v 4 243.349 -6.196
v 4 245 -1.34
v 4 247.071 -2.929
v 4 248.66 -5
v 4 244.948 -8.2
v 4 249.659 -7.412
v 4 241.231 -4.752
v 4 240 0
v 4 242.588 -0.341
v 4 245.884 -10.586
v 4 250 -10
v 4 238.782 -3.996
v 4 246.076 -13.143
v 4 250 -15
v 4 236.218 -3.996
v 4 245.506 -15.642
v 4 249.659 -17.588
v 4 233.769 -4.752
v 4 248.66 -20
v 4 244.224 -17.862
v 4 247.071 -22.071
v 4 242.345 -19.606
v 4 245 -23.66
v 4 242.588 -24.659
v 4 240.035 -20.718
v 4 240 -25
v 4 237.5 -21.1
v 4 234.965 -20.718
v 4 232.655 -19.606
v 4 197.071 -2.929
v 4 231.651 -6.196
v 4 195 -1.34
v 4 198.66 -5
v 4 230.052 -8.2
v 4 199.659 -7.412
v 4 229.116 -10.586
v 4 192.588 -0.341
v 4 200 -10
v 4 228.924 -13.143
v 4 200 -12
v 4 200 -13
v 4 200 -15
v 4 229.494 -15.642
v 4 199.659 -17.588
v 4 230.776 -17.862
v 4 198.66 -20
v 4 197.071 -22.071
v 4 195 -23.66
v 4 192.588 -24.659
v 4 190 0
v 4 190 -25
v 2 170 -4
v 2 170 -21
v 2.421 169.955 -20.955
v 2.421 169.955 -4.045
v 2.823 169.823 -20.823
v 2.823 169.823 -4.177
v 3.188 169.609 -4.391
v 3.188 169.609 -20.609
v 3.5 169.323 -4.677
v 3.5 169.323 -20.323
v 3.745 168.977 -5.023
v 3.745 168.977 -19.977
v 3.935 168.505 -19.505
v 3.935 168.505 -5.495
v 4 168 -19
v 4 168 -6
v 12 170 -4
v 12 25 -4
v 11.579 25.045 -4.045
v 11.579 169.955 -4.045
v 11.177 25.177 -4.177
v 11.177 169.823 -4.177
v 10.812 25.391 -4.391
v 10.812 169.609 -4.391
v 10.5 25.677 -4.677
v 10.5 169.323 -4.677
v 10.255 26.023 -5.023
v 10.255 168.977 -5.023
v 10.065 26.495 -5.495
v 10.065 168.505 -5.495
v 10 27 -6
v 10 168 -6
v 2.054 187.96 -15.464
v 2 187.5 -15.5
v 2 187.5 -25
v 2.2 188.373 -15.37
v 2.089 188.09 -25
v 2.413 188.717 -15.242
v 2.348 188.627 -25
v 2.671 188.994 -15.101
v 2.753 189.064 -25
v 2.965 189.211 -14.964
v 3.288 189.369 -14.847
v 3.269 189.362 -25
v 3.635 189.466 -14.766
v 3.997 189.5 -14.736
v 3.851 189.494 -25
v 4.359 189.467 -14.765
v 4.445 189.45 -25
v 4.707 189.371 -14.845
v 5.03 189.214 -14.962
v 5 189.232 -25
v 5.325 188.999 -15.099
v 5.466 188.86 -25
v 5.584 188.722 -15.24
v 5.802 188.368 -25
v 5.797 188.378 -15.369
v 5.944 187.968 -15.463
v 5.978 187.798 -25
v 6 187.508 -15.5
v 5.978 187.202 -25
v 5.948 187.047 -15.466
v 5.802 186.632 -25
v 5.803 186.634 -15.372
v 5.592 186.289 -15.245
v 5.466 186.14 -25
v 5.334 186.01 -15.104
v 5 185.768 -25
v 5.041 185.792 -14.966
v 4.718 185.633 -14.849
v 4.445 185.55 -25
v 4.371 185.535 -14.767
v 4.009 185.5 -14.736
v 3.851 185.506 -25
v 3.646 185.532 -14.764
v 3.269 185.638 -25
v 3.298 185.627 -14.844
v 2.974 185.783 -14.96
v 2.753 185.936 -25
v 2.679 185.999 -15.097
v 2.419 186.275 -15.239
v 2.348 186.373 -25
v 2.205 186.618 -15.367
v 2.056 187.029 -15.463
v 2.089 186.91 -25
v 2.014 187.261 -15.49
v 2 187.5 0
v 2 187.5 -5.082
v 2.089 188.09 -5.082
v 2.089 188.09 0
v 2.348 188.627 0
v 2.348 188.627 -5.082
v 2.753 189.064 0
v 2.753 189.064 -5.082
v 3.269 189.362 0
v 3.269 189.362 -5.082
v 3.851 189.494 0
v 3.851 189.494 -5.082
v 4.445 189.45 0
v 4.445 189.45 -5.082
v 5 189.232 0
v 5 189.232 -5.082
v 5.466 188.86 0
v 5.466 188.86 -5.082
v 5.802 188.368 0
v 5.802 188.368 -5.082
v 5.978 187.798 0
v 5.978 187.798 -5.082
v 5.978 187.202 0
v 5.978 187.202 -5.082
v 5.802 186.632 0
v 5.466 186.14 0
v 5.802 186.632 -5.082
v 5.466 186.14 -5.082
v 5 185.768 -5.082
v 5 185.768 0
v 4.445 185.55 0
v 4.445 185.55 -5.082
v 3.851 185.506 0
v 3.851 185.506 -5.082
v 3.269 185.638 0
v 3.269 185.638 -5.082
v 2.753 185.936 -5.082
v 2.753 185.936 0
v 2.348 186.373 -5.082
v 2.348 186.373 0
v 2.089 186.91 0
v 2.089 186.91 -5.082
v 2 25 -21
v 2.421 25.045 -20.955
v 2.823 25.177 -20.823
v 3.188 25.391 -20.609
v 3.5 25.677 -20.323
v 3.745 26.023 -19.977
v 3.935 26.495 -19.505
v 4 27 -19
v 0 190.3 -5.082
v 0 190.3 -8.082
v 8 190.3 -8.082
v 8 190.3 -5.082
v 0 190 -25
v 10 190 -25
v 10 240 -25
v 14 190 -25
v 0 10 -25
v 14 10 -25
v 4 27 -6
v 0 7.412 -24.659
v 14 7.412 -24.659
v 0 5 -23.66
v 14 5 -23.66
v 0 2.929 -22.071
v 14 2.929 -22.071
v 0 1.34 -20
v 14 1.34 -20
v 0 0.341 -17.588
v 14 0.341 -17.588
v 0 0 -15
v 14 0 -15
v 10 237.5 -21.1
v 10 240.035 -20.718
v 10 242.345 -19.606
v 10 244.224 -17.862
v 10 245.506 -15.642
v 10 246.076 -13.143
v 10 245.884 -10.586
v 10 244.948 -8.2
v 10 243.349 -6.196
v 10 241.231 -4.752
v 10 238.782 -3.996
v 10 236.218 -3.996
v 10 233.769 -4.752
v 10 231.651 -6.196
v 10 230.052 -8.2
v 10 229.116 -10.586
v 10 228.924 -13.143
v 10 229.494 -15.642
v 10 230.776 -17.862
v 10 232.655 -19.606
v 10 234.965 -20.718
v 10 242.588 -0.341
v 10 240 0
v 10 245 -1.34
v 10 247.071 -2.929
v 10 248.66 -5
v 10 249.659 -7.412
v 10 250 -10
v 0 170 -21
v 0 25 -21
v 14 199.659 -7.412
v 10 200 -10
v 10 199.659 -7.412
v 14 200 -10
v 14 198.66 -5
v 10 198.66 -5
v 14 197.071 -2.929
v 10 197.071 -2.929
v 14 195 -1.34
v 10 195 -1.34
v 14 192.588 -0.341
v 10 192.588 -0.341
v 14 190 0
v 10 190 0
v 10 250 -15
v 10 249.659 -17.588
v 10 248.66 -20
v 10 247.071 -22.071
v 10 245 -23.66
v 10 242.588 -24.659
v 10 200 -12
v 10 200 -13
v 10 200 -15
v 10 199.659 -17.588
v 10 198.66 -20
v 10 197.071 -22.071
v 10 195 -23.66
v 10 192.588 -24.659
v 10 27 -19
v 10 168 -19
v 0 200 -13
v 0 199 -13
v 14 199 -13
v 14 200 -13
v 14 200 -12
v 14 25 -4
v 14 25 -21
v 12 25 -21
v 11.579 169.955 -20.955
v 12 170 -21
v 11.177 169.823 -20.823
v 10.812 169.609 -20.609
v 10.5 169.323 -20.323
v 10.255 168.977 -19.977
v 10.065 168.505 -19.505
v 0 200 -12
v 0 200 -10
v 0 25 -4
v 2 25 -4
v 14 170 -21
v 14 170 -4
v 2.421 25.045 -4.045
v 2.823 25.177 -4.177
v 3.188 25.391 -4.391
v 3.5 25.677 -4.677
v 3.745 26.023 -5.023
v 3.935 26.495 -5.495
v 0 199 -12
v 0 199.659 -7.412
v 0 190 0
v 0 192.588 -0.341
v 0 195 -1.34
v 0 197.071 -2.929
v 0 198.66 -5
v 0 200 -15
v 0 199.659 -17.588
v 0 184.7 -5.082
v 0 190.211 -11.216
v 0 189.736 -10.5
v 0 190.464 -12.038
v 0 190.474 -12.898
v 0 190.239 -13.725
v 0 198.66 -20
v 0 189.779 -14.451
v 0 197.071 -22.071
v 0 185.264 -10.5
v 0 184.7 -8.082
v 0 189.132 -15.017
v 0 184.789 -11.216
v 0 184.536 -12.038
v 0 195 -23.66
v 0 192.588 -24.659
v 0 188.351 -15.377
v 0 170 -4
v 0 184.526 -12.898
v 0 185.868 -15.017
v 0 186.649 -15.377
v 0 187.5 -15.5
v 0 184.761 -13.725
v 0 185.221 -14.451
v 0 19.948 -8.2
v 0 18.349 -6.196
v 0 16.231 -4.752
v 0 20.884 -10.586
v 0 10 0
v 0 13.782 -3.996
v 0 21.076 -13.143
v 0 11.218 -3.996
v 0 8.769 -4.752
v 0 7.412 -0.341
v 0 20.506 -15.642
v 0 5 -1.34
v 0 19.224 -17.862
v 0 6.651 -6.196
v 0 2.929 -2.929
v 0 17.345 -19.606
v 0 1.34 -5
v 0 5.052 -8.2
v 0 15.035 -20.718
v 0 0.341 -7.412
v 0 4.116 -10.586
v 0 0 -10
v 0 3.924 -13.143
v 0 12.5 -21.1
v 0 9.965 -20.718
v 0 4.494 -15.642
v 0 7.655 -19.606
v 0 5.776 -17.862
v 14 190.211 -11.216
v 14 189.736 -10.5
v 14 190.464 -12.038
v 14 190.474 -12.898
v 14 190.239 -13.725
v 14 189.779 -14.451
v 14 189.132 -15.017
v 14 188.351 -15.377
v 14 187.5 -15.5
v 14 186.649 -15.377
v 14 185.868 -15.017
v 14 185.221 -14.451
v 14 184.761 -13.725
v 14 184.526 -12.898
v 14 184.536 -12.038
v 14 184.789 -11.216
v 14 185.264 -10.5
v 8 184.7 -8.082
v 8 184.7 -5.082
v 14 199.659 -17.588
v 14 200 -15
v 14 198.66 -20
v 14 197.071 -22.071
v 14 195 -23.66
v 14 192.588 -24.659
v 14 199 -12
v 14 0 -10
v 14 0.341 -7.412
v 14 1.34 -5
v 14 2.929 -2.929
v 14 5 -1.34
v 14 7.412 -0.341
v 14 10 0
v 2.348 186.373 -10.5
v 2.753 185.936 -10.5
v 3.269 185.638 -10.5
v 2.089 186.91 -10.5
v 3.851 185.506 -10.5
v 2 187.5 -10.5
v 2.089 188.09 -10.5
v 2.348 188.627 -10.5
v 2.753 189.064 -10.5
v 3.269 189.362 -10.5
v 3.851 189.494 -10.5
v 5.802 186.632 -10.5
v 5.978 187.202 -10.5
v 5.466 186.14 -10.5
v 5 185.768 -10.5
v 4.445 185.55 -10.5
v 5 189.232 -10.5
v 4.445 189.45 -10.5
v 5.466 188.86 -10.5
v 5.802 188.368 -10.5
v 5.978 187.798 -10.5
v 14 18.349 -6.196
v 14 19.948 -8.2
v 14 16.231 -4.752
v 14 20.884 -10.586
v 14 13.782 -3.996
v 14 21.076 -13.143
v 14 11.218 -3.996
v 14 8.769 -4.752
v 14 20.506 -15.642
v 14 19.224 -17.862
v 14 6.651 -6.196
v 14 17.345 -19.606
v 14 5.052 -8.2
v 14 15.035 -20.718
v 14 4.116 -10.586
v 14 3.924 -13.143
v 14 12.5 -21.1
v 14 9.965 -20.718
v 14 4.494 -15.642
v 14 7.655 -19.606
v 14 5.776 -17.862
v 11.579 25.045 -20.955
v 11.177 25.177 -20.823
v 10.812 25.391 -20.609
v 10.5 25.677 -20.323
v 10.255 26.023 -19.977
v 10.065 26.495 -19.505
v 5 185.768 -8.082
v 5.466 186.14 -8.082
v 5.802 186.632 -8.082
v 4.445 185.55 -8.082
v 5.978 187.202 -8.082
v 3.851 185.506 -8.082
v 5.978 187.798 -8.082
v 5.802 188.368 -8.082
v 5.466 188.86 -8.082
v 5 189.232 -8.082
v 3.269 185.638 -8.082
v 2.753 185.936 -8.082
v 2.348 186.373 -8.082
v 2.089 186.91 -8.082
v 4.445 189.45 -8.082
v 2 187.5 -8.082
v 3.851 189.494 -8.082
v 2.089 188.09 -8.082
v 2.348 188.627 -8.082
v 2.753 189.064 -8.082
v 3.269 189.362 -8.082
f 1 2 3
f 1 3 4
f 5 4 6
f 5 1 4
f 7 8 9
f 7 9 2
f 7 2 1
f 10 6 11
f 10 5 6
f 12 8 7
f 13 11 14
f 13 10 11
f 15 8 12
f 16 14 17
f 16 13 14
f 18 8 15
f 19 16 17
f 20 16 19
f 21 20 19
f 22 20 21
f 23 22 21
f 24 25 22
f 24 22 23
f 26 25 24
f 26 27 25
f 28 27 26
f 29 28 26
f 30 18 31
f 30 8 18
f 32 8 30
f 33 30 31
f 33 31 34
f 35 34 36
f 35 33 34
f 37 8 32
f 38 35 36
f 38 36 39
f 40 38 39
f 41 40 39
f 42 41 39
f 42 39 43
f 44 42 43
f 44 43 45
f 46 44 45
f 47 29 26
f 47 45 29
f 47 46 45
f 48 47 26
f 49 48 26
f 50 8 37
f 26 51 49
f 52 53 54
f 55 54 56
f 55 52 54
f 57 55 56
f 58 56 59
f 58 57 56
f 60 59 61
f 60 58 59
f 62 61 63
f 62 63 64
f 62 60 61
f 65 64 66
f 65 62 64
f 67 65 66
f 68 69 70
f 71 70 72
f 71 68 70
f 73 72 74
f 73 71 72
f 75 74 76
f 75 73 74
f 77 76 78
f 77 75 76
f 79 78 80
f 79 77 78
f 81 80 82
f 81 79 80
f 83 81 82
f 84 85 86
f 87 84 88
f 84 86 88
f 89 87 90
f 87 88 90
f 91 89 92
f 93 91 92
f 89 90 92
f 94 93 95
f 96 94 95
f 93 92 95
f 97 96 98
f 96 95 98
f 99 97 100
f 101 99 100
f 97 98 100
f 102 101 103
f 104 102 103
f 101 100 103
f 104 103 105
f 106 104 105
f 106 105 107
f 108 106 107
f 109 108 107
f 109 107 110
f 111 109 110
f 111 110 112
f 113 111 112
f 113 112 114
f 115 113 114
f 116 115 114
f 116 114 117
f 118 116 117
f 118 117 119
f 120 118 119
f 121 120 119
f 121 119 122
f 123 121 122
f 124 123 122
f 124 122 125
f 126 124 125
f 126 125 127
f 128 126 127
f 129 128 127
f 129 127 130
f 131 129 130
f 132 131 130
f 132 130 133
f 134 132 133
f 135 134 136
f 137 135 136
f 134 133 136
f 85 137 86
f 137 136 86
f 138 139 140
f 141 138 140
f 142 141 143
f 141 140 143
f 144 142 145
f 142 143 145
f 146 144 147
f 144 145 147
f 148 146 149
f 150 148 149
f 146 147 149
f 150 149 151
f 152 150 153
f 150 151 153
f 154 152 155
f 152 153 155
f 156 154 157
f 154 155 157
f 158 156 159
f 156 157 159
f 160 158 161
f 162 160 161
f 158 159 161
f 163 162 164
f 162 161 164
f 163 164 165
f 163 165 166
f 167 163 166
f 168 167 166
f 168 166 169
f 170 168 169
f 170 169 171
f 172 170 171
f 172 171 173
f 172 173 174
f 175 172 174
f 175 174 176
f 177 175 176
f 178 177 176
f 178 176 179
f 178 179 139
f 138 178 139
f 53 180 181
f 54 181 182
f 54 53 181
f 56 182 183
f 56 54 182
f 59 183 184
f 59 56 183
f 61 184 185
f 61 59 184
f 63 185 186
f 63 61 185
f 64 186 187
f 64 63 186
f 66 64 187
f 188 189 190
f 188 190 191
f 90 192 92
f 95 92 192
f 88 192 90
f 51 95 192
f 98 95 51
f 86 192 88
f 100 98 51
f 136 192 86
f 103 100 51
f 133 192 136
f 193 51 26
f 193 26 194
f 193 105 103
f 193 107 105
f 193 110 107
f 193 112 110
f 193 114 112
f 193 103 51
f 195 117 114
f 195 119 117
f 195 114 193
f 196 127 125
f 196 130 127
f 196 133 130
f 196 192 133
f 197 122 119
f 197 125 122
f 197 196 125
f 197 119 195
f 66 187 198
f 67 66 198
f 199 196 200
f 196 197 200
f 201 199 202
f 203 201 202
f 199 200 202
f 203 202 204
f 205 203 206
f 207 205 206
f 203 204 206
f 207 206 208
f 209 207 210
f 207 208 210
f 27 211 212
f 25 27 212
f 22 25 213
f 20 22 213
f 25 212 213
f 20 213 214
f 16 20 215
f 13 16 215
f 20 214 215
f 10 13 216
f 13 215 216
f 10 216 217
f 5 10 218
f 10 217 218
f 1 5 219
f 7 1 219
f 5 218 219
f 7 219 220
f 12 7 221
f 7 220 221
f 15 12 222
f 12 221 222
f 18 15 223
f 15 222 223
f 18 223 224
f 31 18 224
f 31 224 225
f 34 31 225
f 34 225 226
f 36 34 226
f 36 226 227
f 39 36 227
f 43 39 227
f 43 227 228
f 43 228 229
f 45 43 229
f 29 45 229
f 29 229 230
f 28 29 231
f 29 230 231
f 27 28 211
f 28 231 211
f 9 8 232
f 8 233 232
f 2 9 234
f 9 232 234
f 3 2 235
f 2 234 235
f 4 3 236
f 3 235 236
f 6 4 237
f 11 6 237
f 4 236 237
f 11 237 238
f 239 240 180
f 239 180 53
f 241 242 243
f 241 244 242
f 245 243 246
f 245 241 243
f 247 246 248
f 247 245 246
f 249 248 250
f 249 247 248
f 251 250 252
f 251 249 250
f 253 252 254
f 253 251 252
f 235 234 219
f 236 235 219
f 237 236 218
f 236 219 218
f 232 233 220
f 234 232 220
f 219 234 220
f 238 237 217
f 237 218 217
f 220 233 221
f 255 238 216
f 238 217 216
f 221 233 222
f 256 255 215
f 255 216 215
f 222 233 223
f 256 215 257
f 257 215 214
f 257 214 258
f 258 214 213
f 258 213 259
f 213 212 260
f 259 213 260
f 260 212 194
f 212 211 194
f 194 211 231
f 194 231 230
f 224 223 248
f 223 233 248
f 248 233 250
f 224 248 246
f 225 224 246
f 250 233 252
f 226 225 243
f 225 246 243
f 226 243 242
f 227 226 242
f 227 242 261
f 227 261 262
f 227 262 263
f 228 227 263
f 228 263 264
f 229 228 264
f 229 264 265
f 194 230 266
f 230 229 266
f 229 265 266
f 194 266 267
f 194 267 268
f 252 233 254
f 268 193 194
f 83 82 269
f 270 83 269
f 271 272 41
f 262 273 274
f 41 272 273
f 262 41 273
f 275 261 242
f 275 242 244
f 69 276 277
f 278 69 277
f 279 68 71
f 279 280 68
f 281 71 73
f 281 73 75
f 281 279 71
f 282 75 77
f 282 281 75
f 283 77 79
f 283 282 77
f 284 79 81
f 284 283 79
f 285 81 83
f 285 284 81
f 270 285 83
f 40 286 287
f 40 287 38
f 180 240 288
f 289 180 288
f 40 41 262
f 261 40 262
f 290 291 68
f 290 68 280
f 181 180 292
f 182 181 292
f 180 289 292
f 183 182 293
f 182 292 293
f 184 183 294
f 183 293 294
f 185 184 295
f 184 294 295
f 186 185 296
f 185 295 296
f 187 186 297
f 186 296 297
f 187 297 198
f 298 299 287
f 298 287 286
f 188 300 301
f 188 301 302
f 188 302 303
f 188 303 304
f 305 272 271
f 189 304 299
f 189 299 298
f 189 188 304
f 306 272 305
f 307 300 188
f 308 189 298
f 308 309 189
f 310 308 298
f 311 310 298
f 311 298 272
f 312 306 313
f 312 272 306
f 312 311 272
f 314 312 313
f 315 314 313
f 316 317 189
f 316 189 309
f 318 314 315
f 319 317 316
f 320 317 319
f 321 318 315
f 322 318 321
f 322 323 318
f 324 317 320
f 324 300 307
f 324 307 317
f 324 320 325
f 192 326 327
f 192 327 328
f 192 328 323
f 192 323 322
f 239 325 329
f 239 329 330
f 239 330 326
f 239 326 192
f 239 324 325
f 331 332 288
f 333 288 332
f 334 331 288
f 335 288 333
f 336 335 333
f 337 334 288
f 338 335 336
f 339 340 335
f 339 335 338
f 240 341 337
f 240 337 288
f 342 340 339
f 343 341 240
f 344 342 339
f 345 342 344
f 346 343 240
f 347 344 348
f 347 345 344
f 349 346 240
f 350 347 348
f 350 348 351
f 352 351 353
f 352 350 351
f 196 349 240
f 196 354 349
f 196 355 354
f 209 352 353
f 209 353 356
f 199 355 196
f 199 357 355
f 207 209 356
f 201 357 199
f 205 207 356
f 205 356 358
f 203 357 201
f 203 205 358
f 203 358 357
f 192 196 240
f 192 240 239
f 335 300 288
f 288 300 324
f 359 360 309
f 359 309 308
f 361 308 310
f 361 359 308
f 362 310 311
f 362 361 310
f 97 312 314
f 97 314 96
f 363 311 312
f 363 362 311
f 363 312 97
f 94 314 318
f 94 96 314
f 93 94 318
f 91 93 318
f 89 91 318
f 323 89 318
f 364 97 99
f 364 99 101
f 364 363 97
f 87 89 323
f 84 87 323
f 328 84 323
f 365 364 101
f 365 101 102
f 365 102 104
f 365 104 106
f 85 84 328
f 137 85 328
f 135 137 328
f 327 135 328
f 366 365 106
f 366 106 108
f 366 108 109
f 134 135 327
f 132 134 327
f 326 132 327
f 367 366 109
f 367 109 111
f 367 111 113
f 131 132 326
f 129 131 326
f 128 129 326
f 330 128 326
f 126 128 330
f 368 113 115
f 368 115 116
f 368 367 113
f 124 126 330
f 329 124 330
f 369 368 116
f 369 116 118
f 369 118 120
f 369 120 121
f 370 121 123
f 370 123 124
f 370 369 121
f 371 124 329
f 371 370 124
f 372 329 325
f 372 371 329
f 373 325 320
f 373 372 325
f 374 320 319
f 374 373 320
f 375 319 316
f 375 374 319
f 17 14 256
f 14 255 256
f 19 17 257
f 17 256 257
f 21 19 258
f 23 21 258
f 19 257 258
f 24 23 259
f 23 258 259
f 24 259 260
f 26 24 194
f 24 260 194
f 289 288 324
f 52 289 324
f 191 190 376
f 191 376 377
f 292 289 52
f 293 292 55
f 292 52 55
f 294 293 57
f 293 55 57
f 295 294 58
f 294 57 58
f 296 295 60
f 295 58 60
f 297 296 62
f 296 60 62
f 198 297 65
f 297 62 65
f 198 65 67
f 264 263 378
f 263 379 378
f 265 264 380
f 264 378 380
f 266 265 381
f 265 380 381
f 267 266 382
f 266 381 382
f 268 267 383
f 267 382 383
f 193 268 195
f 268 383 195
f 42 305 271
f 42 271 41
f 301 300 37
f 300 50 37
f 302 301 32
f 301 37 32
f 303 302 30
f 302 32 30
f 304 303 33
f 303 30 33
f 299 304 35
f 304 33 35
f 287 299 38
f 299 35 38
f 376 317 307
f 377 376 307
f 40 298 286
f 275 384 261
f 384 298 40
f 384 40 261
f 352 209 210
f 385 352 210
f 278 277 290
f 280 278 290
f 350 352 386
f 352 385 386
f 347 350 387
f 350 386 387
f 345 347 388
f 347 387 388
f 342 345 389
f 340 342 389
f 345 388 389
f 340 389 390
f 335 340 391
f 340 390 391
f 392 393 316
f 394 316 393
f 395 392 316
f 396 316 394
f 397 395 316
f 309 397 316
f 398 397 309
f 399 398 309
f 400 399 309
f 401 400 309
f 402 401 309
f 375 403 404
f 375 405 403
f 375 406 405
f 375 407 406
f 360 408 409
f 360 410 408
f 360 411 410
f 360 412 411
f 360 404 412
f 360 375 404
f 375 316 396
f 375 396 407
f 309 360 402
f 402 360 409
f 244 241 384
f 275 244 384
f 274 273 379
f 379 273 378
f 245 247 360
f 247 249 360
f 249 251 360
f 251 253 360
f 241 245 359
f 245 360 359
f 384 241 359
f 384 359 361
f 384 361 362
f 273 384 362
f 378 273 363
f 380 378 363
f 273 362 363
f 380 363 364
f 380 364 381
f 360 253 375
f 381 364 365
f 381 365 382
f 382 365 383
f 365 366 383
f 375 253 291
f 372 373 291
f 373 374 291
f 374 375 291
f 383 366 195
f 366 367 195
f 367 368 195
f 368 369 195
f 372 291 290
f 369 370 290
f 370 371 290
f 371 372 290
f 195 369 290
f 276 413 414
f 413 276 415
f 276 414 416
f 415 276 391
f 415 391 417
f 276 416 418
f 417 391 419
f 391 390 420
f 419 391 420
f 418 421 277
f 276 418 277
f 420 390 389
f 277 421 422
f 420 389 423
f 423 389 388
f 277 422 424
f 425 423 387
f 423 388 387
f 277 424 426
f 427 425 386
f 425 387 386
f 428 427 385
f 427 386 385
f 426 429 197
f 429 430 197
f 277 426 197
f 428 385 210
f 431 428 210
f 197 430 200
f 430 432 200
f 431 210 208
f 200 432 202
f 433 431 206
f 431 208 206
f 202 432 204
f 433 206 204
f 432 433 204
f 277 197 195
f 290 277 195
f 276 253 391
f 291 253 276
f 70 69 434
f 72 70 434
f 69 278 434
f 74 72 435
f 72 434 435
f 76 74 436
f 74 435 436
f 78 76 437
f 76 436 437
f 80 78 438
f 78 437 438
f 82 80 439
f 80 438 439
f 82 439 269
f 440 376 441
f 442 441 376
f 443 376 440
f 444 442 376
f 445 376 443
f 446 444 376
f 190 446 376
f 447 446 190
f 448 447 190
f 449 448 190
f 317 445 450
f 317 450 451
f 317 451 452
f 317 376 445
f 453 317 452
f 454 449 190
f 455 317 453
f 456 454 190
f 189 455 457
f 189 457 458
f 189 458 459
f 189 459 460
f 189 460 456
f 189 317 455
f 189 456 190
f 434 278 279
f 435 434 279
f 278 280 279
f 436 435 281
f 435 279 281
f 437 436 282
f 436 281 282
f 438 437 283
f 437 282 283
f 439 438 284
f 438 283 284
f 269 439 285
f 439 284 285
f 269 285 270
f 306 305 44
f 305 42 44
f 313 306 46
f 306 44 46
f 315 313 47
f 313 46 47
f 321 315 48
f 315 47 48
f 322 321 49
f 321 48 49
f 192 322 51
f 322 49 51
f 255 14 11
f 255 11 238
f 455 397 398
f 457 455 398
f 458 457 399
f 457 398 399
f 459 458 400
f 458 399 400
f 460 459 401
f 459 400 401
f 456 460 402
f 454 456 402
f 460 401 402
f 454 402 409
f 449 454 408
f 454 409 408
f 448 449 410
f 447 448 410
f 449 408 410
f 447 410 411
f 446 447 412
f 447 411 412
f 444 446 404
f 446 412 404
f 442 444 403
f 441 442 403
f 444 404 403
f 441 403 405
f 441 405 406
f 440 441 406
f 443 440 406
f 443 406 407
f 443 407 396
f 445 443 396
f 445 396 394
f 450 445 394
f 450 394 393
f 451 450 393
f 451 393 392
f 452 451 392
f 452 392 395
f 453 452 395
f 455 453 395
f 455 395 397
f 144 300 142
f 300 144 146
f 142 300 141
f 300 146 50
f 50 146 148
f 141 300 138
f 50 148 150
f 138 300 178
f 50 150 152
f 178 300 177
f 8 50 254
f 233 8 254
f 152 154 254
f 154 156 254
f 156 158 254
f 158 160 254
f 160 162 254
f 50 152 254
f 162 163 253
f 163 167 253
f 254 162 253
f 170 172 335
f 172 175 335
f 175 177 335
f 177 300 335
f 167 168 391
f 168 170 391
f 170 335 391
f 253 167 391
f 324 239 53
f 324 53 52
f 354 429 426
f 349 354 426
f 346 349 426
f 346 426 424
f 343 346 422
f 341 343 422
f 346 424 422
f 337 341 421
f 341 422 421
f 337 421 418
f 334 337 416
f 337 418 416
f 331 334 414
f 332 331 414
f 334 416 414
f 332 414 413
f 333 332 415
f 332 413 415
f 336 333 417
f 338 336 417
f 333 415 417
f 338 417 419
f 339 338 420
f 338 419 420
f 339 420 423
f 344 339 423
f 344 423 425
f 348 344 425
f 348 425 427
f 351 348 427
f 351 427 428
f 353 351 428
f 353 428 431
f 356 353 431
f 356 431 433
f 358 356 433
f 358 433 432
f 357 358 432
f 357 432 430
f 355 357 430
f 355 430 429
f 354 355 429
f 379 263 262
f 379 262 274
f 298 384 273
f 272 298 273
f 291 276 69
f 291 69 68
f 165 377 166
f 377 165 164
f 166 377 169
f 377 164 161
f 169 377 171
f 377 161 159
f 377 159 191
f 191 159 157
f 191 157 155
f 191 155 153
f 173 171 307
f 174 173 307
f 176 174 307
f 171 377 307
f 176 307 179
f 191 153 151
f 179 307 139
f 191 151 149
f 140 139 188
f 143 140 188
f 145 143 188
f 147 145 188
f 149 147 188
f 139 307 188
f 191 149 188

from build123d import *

# Parameters (mm, degrees)
CROQUIS1_W              = 14
CROQUIS1_H              = 25
SALIENTE_EXTRUIR1_DEPTH = 200
REDONDEO1_R             = 10
REDONDEO2_R             = 10
CROQUIS2_R              = 8.6
CORTAR_EXTRUIR1_DEPTH   = 28
CROQUIS14_R             = 9.913044
SALIENTE_EXTRUIR2_DEPTH = 14
CROQUIS12_R             = 2
CORTAR_EXTRUIR7_DEPTH   = 203.042074826
CROQUIS15_W             = 3
CROQUIS15_H             = 5.6
CORTAR_EXTRUIR9_DEPTH   = 8
CROQUIS16_W             = 17
CROQUIS16_H             = 145
CORTAR_EXTRUIR10_DEPTH  = 4
CROQUIS17_W             = 17
CROQUIS17_H             = 145
CORTAR_EXTRUIR11_DEPTH  = 4
REDONDEO5_R             = 2
REDONDEO6_R             = 2
CROQUIS18_W             = 1
CROQUIS18_H             = 1
CORTAR_EXTRUIR12_DEPTH  = 203.042074845
CROQUIS19_W             = 6
CROQUIS19_H             = 25
SALIENTE_EXTRUIR3_DEPTH = 50
CROQUIS20_R             = 8.6
CORTAR_EXTRUIR13_DEPTH  = 6
REDONDEO7_R             = 10
REDONDEO8_R             = 10
REDONDEO9_R             = 10
REDONDEO10_R            = 10
REDONDEO11_R            = 10
REDONDEO12_R            = 10


with BuildPart() as part:
    # Croquis1 → Saliente-Extruir1 (new body)
    with BuildSketch(Plane(origin=(0, 0, 0), x_dir=(1, 0, 0), z_dir=(0, 1, 0))):
        with Locations((7, 12.5)):
            Rectangle(CROQUIS1_W, CROQUIS1_H)
    extrude(amount=SALIENTE_EXTRUIR1_DEPTH)

    # Redondeo1
    redondeo1_edges = [part.edges().sort_by_distance(p)[0] for p in [
        (7, 0, -25),
    ]]
    fillet(redondeo1_edges, radius=REDONDEO1_R)

    # Redondeo2
    redondeo2_edges = [part.edges().sort_by_distance(p)[0] for p in [
        (7, 0, 0),
    ]]
    fillet(redondeo2_edges, radius=REDONDEO2_R)

    # Croquis2 → Cortar-Extruir1 (cut)
    with BuildSketch(Plane(origin=(14, 0, 0), x_dir=(0, 0, -1), z_dir=(1, 0, 0))):
        with Locations((12.5, 12.5)):
            Circle(CROQUIS2_R)
        with BuildLine():
            Line((10.5, 185.263932023), (10.5, 189.736067977))
            ThreePointArc((10.5, 189.736067977), (15.5, 187.5), (10.5, 185.263932023))
        make_face()
    extrude(amount=-CORTAR_EXTRUIR1_DEPTH, mode=Mode.SUBTRACT)

    # Croquis14 → Saliente-Extruir2 (add)
    with BuildSketch(Plane(origin=(14, 0, 0), x_dir=(0, 0, -1), z_dir=(1, 0, 0))):
        with Locations((12.5, 187.5)):
            Circle(CROQUIS14_R)
        with BuildLine():
            Line((10.5, 185.263932023), (10.5, 189.736067977))
            ThreePointArc((10.5, 189.736067977), (15.5, 187.5), (10.5, 185.263932023))
        make_face(mode=Mode.SUBTRACT)
    extrude(amount=-SALIENTE_EXTRUIR2_DEPTH)

    # Croquis12 → Cortar-Extruir7 (cut, through all)
    with BuildSketch(Plane(origin=(0, 0, -25), x_dir=(-1, 0, 0), z_dir=(0, 0, -1))):
        with Locations((-4, 187.5)):
            Circle(CROQUIS12_R)
    extrude(amount=-CORTAR_EXTRUIR7_DEPTH, mode=Mode.SUBTRACT)

    # Croquis15 → Cortar-Extruir9 (cut)
    with BuildSketch(Plane.ZY):
        with Locations((-6.582205818, 187.5)):
            Rectangle(CROQUIS15_W, CROQUIS15_H)
    extrude(amount=-CORTAR_EXTRUIR9_DEPTH, mode=Mode.SUBTRACT)

    # Croquis16 → Cortar-Extruir10 (cut)
    with BuildSketch(Plane.ZY):
        with Locations((-12.5, 97.5)):
            Rectangle(CROQUIS16_W, CROQUIS16_H)
    extrude(amount=-CORTAR_EXTRUIR10_DEPTH, mode=Mode.SUBTRACT)

    # Croquis17 → Cortar-Extruir11 (cut)
    with BuildSketch(Plane(origin=(14, 0, 0), x_dir=(0, 0, -1), z_dir=(1, 0, 0))):
        with Locations((12.5, 97.5)):
            Rectangle(CROQUIS17_W, CROQUIS17_H)
    extrude(amount=-CORTAR_EXTRUIR11_DEPTH, mode=Mode.SUBTRACT)

    # Redondeo5
    redondeo5_edges = [part.edges().sort_by_distance(p)[0] for p in [
        (4, 97.5, -21),
        (4, 170, -12.5),
        (4, 97.5, -4),
        (4, 25, -12.5),
    ]]
    fillet(redondeo5_edges, radius=REDONDEO5_R)

    # Redondeo6
    redondeo6_edges = [part.edges().sort_by_distance(p)[0] for p in [
        (10, 97.5, -21),
        (10, 25, -12.5),
        (10, 97.5, -4),
        (10, 170, -12.5),
    ]]
    fillet(redondeo6_edges, radius=REDONDEO6_R)

    # Croquis18 → Cortar-Extruir12 (cut, through all)
    with BuildSketch(Plane(origin=(14, 0, 0), x_dir=(0, 0, -1), z_dir=(1, 0, 0))):
        with Locations((12.5, 199.5)):
            Rectangle(CROQUIS18_W, CROQUIS18_H)
    extrude(amount=-CORTAR_EXTRUIR12_DEPTH, mode=Mode.SUBTRACT)

    # Croquis19 → Saliente-Extruir3 (add)
    with BuildSketch(Plane(origin=(0, 200, 0), x_dir=(1, 0, 0), z_dir=(0, 1, 0))):
        with Locations((7, 12.5)):
            Rectangle(CROQUIS19_W, CROQUIS19_H)
    extrude(amount=SALIENTE_EXTRUIR3_DEPTH)

    # Croquis20 → Cortar-Extruir13 (cut)
    with BuildSketch(Plane(origin=(10, 0, 0), x_dir=(0, 0, -1), z_dir=(1, 0, 0))):
        with Locations((12.5, 237.5)):
            Circle(CROQUIS20_R)
    extrude(amount=-CORTAR_EXTRUIR13_DEPTH, mode=Mode.SUBTRACT)

    # Redondeo7
    redondeo7_edges = [part.edges().sort_by_distance(p)[0] for p in [
        (7, 250, 0),
    ]]
    fillet(redondeo7_edges, radius=REDONDEO7_R)

    # Redondeo8
    redondeo8_edges = [part.edges().sort_by_distance(p)[0] for p in [
        (7, 250, -25),
    ]]
    fillet(redondeo8_edges, radius=REDONDEO8_R)

    # Redondeo9
    redondeo9_edges = [part.edges().sort_by_distance(p)[0] for p in [
        (2, 200, 0),
    ]]
    fillet(redondeo9_edges, radius=REDONDEO9_R)

    # Redondeo10
    redondeo10_edges = [part.edges().sort_by_distance(p)[0] for p in [
        (12, 200, 0),
    ]]
    fillet(redondeo10_edges, radius=REDONDEO10_R)

    # Redondeo11
    redondeo11_edges = [part.edges().sort_by_distance(p)[0] for p in [
        (12, 200, -25),
    ]]
    fillet(redondeo11_edges, radius=REDONDEO11_R)

    # Redondeo12
    redondeo12_edges = [part.edges().sort_by_distance(p)[0] for p in [
        (2, 200, -25),
    ]]
    fillet(redondeo12_edges, radius=REDONDEO12_R)


solid = part.part
